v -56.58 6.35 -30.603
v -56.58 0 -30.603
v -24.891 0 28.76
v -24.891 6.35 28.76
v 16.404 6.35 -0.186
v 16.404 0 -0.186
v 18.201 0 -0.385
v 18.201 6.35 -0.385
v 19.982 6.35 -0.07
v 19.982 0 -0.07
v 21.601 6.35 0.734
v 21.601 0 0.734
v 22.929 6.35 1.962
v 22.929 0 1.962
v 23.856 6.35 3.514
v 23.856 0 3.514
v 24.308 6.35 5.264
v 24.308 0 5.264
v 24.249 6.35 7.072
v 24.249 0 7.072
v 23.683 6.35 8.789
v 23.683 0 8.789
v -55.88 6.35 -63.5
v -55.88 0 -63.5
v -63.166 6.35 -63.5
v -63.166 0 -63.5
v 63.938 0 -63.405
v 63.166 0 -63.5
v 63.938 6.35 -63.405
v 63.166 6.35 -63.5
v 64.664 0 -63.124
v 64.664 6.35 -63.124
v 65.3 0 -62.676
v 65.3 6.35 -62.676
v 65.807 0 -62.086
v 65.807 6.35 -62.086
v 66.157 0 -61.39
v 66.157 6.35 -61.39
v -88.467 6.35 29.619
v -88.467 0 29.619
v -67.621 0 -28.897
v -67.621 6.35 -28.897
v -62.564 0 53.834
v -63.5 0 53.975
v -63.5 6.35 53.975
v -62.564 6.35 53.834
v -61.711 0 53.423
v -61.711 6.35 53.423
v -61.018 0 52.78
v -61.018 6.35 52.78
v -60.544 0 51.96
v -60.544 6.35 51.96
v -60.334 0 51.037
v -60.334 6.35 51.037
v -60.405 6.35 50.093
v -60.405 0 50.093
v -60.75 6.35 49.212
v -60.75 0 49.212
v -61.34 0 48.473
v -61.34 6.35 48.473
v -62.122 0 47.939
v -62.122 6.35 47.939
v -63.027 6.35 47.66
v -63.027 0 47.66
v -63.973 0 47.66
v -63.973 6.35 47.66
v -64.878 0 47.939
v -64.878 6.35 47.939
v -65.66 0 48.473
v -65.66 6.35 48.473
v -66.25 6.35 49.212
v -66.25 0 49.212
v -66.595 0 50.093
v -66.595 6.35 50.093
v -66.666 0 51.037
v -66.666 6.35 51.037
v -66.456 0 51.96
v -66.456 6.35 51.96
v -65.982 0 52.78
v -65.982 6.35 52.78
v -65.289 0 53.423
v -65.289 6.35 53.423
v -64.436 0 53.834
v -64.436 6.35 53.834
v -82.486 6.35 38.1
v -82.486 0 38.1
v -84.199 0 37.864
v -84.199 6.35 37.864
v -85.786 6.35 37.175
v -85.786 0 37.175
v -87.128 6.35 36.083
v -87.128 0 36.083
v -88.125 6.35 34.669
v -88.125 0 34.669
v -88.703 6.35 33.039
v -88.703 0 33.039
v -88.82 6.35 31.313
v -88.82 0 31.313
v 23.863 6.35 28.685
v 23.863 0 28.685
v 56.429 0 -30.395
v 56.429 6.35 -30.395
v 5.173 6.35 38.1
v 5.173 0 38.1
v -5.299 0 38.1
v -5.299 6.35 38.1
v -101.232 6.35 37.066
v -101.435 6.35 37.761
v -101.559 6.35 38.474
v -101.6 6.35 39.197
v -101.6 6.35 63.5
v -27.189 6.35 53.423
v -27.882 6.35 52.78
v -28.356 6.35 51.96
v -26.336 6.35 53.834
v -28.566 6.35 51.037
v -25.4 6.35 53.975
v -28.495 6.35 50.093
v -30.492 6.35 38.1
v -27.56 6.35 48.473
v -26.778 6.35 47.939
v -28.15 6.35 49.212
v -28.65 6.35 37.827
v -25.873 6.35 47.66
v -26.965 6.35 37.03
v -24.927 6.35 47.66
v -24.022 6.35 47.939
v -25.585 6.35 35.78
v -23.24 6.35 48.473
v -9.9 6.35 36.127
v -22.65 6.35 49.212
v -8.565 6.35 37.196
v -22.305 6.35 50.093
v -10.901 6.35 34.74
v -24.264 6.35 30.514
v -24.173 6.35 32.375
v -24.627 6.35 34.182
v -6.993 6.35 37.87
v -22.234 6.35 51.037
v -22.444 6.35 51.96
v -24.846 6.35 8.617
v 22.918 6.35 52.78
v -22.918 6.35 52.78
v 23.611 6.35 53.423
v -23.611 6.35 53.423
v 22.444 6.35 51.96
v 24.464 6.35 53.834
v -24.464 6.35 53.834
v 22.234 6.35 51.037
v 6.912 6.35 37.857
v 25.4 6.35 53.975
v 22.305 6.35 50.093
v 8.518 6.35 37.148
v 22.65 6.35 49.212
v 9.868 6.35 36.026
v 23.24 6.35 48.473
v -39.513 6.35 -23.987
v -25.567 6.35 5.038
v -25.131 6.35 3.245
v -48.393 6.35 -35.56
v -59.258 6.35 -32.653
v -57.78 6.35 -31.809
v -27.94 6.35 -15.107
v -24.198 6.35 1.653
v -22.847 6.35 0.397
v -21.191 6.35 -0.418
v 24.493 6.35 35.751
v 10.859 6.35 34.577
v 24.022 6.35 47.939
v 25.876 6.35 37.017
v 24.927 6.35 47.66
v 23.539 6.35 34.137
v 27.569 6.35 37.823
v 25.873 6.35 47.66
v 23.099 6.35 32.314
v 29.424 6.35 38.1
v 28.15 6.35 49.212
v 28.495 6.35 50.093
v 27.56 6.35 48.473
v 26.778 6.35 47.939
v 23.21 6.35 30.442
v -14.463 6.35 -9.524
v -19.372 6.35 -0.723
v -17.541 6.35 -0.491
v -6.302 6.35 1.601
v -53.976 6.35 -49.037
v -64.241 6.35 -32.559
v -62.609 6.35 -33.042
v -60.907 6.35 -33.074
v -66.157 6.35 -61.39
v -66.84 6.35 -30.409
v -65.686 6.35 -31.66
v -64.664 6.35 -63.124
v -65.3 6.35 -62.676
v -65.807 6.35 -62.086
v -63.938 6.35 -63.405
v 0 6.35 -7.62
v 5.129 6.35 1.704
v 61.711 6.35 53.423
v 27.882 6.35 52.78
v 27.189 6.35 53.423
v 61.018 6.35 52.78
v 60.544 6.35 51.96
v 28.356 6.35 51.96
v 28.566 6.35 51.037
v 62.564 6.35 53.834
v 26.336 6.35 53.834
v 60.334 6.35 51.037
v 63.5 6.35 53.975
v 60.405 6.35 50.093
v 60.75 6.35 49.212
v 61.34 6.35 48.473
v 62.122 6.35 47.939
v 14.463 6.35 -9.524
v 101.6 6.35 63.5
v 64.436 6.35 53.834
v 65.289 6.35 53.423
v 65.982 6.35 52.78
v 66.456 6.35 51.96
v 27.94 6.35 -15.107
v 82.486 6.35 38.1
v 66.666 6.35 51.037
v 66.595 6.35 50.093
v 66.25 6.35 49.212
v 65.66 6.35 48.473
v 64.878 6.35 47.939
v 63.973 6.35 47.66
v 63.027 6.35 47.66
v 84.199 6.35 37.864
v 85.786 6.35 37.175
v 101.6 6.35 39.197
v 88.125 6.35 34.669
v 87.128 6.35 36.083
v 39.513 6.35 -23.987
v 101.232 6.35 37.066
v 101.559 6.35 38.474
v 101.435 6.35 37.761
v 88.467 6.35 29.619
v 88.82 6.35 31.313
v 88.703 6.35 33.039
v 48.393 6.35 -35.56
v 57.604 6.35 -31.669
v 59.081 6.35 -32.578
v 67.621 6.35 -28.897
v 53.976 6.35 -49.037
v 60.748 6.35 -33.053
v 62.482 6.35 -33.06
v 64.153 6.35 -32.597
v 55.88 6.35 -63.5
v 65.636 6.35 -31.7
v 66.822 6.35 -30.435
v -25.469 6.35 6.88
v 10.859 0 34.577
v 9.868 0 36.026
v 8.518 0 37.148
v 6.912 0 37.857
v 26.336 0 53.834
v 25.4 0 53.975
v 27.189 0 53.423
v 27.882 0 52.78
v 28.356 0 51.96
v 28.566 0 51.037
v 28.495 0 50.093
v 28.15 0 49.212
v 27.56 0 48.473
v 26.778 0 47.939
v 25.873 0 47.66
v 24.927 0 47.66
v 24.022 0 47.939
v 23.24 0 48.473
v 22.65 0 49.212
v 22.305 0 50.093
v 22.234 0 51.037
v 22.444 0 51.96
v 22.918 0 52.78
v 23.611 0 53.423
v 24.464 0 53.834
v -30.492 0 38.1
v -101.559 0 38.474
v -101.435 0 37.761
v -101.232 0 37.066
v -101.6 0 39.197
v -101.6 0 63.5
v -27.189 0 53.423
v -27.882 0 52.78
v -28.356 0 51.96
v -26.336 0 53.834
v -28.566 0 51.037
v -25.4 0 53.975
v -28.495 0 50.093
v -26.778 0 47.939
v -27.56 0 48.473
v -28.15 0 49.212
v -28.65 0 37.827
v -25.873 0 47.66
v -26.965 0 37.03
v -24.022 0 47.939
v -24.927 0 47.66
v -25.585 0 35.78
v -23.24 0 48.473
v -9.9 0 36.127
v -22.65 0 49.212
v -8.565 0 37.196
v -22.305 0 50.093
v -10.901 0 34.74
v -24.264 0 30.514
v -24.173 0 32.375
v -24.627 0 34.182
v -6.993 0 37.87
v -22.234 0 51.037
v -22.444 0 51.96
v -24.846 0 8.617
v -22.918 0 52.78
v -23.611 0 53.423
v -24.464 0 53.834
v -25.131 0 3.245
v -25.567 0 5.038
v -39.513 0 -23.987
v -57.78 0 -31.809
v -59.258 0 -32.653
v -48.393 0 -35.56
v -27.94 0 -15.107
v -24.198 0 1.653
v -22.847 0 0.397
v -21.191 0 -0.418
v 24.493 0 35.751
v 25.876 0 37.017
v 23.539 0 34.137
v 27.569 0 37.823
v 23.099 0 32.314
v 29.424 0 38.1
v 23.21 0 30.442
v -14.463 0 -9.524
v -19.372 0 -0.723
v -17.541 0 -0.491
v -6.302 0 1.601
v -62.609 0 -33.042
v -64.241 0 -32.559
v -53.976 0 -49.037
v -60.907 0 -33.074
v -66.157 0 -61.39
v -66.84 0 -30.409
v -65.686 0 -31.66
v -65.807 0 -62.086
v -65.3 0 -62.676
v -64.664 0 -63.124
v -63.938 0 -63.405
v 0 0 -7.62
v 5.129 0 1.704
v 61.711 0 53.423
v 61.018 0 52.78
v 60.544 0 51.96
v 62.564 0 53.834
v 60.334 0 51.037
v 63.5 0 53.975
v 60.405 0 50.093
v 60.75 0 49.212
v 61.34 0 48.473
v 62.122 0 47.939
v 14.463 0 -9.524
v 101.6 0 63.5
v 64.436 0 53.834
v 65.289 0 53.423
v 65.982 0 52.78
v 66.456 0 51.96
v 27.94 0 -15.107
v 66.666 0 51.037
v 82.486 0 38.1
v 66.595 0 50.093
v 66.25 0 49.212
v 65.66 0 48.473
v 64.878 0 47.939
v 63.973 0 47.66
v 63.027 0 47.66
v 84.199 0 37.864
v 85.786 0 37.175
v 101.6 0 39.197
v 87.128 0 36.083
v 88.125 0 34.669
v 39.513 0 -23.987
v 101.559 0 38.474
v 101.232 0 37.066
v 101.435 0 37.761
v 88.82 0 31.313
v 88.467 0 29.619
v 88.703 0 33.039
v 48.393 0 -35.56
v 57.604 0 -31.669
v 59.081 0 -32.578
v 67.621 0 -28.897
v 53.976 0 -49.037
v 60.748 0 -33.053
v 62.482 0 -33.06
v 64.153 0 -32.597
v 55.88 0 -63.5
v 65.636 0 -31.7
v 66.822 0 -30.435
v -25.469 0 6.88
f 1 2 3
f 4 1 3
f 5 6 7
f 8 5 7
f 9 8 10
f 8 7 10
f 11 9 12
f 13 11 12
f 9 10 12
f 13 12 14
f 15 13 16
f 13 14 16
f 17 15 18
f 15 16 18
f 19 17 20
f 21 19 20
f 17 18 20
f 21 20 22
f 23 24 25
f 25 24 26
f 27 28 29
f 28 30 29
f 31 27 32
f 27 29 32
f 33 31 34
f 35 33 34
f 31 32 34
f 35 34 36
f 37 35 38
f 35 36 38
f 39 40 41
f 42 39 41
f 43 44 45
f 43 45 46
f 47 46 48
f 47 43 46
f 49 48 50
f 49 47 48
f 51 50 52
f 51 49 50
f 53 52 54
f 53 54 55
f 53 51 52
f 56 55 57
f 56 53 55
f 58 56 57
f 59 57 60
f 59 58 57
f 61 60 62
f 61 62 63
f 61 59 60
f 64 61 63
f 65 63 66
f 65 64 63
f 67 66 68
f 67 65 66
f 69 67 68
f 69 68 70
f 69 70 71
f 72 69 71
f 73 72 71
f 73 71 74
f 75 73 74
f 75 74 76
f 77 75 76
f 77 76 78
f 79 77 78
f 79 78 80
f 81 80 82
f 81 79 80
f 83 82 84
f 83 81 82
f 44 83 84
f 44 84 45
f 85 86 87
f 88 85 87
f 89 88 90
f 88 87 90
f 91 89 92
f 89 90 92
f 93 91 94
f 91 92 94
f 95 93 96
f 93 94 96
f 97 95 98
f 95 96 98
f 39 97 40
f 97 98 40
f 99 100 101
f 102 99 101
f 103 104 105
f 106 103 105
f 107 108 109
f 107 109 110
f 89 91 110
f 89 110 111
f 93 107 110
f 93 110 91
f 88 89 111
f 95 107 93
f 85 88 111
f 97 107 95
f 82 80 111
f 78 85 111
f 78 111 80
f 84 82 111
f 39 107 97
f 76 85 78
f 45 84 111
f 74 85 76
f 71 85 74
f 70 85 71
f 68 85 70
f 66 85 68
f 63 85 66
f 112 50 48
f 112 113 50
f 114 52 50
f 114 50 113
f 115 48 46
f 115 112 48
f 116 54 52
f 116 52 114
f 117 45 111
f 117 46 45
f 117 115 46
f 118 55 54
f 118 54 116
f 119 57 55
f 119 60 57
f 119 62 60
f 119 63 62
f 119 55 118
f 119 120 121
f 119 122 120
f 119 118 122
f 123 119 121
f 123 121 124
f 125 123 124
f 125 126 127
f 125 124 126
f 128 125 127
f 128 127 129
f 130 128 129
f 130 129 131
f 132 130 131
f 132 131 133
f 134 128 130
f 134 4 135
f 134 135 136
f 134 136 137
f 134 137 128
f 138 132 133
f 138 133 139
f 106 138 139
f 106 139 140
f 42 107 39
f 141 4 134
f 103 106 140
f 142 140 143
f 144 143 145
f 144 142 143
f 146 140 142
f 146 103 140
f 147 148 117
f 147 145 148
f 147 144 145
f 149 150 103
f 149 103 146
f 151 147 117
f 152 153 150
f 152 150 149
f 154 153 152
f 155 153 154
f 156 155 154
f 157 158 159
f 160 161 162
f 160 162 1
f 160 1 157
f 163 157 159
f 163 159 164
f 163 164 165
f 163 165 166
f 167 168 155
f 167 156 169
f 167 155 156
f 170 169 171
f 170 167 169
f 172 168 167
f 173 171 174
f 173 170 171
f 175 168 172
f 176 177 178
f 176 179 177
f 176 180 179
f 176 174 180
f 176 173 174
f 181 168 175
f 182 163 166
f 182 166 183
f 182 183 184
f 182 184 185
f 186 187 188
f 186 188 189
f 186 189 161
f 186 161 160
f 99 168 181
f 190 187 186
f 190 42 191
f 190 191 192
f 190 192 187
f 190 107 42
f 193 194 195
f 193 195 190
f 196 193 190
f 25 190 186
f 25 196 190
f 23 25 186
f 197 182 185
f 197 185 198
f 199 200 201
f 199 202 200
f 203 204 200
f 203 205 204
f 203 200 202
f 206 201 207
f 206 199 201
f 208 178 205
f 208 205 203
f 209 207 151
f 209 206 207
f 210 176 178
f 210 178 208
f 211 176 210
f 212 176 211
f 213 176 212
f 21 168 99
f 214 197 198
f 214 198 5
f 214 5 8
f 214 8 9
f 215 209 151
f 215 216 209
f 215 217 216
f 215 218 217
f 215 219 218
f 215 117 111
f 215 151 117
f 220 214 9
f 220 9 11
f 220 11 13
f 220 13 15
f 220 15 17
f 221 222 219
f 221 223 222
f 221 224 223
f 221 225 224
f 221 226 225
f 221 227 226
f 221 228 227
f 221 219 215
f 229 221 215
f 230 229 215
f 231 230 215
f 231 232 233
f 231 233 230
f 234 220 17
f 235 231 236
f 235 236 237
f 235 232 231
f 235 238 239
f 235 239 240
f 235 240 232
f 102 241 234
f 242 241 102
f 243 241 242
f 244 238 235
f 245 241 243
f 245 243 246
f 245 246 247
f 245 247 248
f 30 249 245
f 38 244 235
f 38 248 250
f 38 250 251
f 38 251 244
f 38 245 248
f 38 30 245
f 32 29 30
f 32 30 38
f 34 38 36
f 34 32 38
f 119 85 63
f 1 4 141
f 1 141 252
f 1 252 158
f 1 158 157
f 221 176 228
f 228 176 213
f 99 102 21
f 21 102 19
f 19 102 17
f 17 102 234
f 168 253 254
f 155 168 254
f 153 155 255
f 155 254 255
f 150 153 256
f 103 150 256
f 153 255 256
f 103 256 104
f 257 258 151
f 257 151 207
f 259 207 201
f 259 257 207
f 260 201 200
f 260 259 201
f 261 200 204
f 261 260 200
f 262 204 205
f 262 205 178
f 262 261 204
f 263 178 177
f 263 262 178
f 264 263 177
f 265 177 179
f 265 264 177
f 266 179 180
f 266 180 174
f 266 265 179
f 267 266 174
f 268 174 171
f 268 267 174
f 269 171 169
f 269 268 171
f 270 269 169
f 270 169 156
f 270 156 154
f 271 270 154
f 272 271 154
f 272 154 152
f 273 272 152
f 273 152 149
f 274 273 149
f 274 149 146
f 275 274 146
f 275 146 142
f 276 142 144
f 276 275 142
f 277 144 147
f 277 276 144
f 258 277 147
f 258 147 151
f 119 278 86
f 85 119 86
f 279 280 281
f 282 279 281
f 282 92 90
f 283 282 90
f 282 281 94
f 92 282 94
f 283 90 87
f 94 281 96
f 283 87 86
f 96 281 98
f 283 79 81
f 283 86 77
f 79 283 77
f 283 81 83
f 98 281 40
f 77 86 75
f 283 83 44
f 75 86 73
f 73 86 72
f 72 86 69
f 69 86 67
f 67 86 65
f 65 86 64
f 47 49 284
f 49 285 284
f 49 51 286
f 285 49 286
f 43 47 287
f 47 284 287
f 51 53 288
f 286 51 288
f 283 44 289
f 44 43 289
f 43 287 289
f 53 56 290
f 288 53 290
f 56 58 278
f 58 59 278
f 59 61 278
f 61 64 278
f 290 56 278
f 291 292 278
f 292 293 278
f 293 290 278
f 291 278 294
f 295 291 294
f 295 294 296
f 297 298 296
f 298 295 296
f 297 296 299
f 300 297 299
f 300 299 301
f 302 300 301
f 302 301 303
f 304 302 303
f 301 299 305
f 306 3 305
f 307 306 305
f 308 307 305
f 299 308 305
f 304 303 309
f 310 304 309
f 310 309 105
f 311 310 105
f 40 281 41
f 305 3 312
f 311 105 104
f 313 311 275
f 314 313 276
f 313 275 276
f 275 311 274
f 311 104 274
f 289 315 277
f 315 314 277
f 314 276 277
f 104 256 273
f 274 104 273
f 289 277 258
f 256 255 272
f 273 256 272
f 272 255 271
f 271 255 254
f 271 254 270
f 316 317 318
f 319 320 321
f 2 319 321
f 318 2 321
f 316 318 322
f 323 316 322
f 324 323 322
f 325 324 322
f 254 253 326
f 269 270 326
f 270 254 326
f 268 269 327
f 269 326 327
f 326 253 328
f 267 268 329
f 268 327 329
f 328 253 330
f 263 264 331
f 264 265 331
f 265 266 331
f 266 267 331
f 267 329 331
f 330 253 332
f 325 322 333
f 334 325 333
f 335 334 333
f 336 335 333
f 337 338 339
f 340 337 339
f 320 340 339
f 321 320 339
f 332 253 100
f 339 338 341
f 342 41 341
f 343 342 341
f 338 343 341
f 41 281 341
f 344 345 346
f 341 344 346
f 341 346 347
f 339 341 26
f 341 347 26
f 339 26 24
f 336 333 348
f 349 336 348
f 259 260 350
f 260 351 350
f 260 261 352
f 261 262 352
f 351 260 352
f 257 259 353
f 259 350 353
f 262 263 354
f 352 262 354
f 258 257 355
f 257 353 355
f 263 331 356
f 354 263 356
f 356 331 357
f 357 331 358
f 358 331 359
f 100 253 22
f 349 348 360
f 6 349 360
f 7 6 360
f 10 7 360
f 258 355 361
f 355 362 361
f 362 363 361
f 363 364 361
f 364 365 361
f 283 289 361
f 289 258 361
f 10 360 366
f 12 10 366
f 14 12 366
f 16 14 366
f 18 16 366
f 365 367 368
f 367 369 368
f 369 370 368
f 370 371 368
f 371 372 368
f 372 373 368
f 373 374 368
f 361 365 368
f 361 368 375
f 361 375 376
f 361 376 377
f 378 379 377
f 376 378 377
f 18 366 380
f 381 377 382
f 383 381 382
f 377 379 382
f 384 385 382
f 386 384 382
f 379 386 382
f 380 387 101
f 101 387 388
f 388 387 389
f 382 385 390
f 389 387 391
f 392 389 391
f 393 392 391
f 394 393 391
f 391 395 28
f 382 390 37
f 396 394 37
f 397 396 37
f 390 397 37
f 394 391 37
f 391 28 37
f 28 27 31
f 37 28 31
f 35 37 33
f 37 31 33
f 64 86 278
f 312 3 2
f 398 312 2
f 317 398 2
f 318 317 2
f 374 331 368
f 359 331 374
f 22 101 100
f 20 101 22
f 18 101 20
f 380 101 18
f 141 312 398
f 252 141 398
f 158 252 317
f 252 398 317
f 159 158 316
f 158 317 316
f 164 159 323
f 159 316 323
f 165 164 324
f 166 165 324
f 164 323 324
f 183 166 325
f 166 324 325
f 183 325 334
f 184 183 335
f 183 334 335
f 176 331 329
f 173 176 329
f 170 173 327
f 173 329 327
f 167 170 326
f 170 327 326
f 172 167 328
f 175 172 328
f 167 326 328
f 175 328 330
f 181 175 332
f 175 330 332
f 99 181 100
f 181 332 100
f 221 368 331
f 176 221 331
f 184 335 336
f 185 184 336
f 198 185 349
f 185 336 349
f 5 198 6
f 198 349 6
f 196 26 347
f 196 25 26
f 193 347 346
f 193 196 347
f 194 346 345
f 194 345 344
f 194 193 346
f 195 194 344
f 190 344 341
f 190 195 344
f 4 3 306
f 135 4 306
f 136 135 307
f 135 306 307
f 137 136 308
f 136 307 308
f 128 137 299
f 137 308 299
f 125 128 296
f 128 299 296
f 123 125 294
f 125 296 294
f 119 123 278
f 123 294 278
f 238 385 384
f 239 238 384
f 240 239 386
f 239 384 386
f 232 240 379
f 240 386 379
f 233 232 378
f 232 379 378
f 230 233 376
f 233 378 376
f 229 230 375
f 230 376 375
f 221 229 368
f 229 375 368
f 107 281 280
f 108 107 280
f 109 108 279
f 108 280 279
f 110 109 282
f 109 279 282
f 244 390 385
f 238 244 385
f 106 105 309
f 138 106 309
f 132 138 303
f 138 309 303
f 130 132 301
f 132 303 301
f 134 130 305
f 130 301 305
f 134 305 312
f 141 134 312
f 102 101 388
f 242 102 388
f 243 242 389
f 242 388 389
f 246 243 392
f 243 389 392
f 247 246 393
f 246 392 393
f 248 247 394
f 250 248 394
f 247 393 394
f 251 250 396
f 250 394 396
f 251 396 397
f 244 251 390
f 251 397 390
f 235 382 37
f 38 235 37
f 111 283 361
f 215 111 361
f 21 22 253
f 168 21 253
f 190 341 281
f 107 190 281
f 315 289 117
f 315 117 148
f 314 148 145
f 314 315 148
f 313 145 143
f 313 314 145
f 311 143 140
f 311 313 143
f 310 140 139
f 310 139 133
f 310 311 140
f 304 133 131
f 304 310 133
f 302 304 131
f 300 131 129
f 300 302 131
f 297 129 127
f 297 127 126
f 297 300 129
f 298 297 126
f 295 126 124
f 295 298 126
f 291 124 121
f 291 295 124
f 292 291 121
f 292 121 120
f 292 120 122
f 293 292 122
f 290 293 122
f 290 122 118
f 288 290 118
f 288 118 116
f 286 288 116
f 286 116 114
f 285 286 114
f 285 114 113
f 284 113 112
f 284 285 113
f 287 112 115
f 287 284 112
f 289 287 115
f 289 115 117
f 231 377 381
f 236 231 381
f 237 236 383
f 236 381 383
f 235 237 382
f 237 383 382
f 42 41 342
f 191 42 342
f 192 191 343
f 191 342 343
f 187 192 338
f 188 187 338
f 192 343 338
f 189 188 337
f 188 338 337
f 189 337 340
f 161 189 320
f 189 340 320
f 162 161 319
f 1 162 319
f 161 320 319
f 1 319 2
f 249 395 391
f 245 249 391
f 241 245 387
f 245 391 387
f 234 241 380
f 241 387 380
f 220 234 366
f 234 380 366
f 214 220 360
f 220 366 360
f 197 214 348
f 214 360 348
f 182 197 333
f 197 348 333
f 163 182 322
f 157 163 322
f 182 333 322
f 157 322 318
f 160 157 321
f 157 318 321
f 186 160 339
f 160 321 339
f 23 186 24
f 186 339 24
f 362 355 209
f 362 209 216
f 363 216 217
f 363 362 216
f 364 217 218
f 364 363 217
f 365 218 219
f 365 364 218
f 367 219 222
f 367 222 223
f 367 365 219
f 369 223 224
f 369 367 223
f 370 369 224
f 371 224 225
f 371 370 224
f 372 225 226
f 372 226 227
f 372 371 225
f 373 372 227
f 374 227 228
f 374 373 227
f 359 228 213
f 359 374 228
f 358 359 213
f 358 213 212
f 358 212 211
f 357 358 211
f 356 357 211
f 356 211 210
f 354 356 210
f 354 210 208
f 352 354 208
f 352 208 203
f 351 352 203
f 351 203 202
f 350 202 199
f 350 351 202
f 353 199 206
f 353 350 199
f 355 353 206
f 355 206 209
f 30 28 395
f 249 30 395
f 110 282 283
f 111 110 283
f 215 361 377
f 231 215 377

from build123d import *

# Parameters (mm, degrees)
SKETCH1_R           = 3.175
BOSS_EXTRUDE1_DEPTH = 6.35
FILLET1_R           = 3.175


with BuildPart() as part:
    # Sketch1 → Boss-Extrude1 (new body)
    with BuildSketch(Plane(origin=(0, 0, 0), x_dir=(1, 0, 0), z_dir=(0, 1, 0))):
        with BuildLine():
            ThreePointArc((55.88, 63.5), (0, 7.62), (-55.88, 63.5))
            Line((-55.88, 63.5), (-65.405, 63.5))
            Line((-65.405, 63.5), (-101.231750934, -37.066318412))
            ThreePointArc((-101.231750934, -37.066318412), (-101.50726052, -38.116025925), (-101.6, -39.197317183))
            Line((-101.6, -39.197317183), (-101.6, -63.5))
            Line((-101.6, -63.5), (101.6, -63.5))
            Line((101.6, -63.5), (101.6, -39.197317183))
            ThreePointArc((101.6, -39.197317183), (101.50726052, -38.116025925), (101.231750934, -37.066318412))
            Line((101.231750934, -37.066318412), (65.405, 63.5))
            Line((65.405, 63.5), (55.88, 63.5))
        make_face()
        with Locations(Location((-63.5, -50.8, 0), (0, 0, 270))):
            Circle(SKETCH1_R, mode=Mode.SUBTRACT)
        with Locations(Location((-25.4, -50.8, 0), (0, 0, 270))):
            Circle(SKETCH1_R, mode=Mode.SUBTRACT)
        with BuildLine():
            Line((-30.492459165, -38.1), (-82.485514384, -38.1))
            ThreePointArc((-82.485514384, -38.1), (-87.67465411, -35.409962965), (-88.467265319, -29.61900123))
            Line((-88.467265319, -29.61900123), (-67.620951247, 28.896968093))
            ThreePointArc((-67.620951247, 28.896968093), (-62.60882158, 33.04150393), (-56.579551543, 30.602954379))
            Line((-56.579551543, 30.602954379), (-24.890648803, -28.759645393))
            ThreePointArc((-24.890648803, -28.759645393), (-25.046761241, -35.016018084), (-30.492459165, -38.1))
        make_face(mode=Mode.SUBTRACT)
        with BuildLine():
            ThreePointArc((-5.299041163, -38.1), (-8.565059247, -37.195697924), (-10.900851525, -34.740354607))
            Line((-10.900851525, -34.740354607), (-24.84623891, -8.616557995))
            ThreePointArc((-24.84623891, -8.616557995), (-24.197984845, -1.653196967), (-17.541381774, 0.491159744))
            ThreePointArc((-17.541381774, 0.491159744), (-0.588821605, -1.902349454), (16.404084946, 0.185546499))
            ThreePointArc((16.404084946, 0.185546499), (22.928583423, -1.961591642), (23.68255589, -8.788802499))
            Line((23.68255589, -8.788802499), (10.859081809, -34.577314678))
            ThreePointArc((10.859081809, -34.577314678), (8.517567892, -37.14796018), (5.173240471, -38.1))
            Line((5.173240471, -38.1), (-5.299041163, -38.1))
        make_face(mode=Mode.SUBTRACT)
        with Locations(Location((25.4, -50.8, 0), (0, 0, 270))):
            Circle(SKETCH1_R, mode=Mode.SUBTRACT)
        with Locations(Location((63.5, -50.8, 0), (0, 0, 270))):
            Circle(SKETCH1_R, mode=Mode.SUBTRACT)
        with BuildLine():
            Line((67.620951247, 28.896968093), (88.467265319, -29.61900123))
            ThreePointArc((88.467265319, -29.61900123), (87.67465411, -35.409962965), (82.485514384, -38.1))
            Line((82.485514384, -38.1), (29.423726477, -38.1))
            ThreePointArc((29.423726477, -38.1), (23.956198754, -34.979340583), (23.862621229, -28.684611212))
            Line((23.862621229, -28.684611212), (56.428690976, 30.395444829))
            ThreePointArc((56.428690976, 30.395444829), (62.481851802, 33.059810636), (67.620951247, 28.896968093))
        make_face(mode=Mode.SUBTRACT)
    extrude(amount=BOSS_EXTRUDE1_DEPTH)

    # Fillet1
    fillet1_edges = [part.edges().sort_by_distance(p)[0] for p in [
        (-65.405, 3.175, -63.5),
        (65.405, 3.175, -63.5),
    ]]
    fillet(fillet1_edges, radius=FILLET1_R)


solid = part.part
